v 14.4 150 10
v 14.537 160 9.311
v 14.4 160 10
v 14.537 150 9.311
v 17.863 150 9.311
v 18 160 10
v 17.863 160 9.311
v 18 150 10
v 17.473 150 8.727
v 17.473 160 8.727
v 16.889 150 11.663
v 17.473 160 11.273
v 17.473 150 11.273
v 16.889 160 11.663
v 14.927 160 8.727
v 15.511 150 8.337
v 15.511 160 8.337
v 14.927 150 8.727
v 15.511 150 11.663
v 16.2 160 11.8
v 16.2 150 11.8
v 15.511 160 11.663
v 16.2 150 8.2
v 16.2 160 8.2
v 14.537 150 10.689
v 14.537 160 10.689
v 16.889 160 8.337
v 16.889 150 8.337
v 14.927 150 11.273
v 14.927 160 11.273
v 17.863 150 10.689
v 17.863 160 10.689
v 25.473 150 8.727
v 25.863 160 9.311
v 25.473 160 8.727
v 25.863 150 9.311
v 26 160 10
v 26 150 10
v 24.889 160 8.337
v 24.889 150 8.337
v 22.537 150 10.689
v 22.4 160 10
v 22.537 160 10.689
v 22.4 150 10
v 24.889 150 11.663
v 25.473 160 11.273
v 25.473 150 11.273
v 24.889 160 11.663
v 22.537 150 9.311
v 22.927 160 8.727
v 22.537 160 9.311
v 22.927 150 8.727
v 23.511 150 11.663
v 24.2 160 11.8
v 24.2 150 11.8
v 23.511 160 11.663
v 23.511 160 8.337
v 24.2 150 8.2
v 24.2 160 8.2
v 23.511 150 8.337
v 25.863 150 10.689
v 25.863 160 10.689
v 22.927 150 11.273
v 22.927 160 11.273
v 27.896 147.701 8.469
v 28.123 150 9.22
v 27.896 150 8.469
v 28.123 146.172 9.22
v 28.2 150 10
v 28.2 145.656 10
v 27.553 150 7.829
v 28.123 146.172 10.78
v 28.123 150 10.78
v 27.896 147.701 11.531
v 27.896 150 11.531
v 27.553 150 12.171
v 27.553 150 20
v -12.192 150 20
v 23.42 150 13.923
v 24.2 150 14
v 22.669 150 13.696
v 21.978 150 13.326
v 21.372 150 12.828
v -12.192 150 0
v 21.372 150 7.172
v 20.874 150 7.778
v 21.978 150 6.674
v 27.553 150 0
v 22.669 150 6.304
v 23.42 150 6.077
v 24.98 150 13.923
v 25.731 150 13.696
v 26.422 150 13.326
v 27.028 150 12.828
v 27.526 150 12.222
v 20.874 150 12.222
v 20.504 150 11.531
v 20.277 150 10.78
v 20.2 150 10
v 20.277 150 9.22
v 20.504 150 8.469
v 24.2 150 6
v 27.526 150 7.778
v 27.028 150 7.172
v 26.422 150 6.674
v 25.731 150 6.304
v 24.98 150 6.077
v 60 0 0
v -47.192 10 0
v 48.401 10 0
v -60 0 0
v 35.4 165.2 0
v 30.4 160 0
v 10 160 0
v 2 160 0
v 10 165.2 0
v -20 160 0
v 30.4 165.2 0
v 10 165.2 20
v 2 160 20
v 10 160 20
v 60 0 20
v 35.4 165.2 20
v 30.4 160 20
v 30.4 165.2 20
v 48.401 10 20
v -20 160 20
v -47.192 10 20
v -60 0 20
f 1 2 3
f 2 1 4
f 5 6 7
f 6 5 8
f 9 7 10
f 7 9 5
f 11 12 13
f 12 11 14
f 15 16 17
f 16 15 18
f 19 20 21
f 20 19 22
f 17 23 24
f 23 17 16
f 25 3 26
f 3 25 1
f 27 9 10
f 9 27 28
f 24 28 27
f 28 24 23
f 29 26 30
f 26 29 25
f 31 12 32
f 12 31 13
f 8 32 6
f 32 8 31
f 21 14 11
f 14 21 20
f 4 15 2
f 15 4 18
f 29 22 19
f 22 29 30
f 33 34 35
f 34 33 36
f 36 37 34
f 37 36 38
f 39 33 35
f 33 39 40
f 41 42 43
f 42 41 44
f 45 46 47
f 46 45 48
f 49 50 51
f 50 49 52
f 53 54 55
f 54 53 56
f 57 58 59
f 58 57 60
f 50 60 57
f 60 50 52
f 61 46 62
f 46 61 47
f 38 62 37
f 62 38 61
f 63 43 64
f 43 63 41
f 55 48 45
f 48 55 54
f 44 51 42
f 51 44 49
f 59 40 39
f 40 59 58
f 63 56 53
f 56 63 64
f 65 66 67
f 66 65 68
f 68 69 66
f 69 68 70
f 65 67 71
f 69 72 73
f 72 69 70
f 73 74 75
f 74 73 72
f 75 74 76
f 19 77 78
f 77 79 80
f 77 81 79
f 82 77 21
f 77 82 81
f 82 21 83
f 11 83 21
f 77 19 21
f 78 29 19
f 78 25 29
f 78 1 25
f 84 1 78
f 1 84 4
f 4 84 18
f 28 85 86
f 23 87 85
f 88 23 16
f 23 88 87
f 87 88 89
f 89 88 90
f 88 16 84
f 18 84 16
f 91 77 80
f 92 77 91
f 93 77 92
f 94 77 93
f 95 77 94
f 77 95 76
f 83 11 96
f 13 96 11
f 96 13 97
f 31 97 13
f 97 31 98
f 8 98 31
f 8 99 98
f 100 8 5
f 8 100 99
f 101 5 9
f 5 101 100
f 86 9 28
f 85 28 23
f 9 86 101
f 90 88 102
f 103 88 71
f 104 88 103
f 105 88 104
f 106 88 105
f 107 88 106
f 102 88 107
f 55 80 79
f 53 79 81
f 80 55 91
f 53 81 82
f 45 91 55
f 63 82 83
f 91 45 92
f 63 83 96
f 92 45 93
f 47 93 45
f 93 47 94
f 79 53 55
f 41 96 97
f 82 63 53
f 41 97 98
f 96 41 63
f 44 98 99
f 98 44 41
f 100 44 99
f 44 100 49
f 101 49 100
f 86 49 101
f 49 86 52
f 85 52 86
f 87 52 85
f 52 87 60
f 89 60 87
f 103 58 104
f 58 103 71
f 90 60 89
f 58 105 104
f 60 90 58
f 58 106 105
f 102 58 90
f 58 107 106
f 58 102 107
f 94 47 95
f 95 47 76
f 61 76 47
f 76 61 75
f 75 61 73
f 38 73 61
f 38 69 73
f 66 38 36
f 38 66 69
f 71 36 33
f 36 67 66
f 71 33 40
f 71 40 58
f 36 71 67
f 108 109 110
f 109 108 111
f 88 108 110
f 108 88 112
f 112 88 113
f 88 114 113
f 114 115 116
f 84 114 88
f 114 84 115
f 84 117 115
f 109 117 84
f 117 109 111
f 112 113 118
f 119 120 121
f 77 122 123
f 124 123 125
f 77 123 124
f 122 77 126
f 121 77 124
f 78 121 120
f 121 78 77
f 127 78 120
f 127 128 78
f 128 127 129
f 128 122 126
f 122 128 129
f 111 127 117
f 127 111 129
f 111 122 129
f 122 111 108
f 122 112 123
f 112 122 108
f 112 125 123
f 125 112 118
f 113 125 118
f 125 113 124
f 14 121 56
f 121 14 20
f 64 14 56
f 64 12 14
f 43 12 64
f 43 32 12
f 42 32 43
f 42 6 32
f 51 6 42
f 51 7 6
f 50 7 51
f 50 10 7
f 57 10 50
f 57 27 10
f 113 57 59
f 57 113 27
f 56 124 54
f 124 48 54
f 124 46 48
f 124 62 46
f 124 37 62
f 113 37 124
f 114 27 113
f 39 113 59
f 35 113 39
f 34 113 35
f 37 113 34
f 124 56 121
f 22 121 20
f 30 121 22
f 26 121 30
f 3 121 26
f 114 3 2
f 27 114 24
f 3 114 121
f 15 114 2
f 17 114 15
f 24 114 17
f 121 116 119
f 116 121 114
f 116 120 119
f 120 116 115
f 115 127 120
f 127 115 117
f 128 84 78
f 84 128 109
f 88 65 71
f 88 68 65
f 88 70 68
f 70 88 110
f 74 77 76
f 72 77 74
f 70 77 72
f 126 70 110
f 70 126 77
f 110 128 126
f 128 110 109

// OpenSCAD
baseLength=120;
topLeftLength=20;
topRightSpaceLength=10;
topBarLeftHolderLength=8;
topBarRightHolderLength=5;

height=160;
width=10;
thickness=20;

barWidth=20+0.4;
barThickness=5+0.2;

screwHoleOffset=8;
screwDiameter=3.6;
nutDiameter=8;

//Computional data:
topWidth=width+barThickness;

topRightLength=topRightSpaceLength+
	barWidth+topBarRightHolderLength;
topLength=topLeftLength+topRightLength;

diffLeftLength=baseLength/2-topLeftLength;
angleLeft=atan(diffLeftLength/height);
armLeftHeight=sqrt(diffLeftLength*diffLeftLength+
	height*height);

rightHeight=height+barThickness;
diffRightLength=baseLength/2-topRightLength;
angleRight=atan(diffRightLength/rightHeight);
armRightHeight=sqrt(diffRightLength*diffRightLength+
	rightHeight*rightHeight);
	
module triangle(l,w)
{
	polygon([
		[0,0],
		[l,w],
		[l,0]
	]);
}

module top()
{
	union()
	{
		translate([-topLeftLength,height-width])
		square([topLength,width]);
		
		translate([topRightSpaceLength-topBarLeftHolderLength,height])
		triangle(topBarLeftHolderLength,barThickness);
		
		translate([topRightSpaceLength,height])
		square([barWidth+topBarRightHolderLength,barThickness]);
	}
}

module base()
{
	translate([-(baseLength-width)/2,0])
	square([baseLength-width,width]);
}

module leftArm()
{
	translate([-baseLength/2,0])
	rotate(-angleLeft)
	square([width,armLeftHeight]);
}

module rightArm()
{
	translate([baseLength/2,0])
	rotate(angleRight)
	translate([-width,0])
	square([width,armRightHeight]);
}

module barHole()
{
	translate([topRightSpaceLength,height])
	square([barWidth,barThickness]);
}

module bottomArmCut()
{
	translate([-baseLength/2-1,-width])
	square([baseLength+2,width]);
}

module main2D()
{
	difference()
	{
		union()
		{
			top();
			base();
			leftArm();
			rightArm();
		}
		
		barHole();
		bottomArmCut();
	}
}

module screwHoles()
{
	for(t=[-1,1])
	{
		x=topRightSpaceLength+barWidth/2+t*screwHoleOffset/2;
		
		translate([x,height-width-1,thickness/2])
		rotate([-90,0,0])
		cylinder(d=screwDiameter,h=width+2,$fn=16);
	}
	
	translate([topRightSpaceLength+barWidth/2+
		screwHoleOffset/2,height-width-40,thickness/2])
	rotate([-90,0,0])
	cylinder(d=nutDiameter,h=40,$fn=32);
}

difference()
{
	linear_extrude(thickness)
	main2D();
	
	screwHoles();
}
